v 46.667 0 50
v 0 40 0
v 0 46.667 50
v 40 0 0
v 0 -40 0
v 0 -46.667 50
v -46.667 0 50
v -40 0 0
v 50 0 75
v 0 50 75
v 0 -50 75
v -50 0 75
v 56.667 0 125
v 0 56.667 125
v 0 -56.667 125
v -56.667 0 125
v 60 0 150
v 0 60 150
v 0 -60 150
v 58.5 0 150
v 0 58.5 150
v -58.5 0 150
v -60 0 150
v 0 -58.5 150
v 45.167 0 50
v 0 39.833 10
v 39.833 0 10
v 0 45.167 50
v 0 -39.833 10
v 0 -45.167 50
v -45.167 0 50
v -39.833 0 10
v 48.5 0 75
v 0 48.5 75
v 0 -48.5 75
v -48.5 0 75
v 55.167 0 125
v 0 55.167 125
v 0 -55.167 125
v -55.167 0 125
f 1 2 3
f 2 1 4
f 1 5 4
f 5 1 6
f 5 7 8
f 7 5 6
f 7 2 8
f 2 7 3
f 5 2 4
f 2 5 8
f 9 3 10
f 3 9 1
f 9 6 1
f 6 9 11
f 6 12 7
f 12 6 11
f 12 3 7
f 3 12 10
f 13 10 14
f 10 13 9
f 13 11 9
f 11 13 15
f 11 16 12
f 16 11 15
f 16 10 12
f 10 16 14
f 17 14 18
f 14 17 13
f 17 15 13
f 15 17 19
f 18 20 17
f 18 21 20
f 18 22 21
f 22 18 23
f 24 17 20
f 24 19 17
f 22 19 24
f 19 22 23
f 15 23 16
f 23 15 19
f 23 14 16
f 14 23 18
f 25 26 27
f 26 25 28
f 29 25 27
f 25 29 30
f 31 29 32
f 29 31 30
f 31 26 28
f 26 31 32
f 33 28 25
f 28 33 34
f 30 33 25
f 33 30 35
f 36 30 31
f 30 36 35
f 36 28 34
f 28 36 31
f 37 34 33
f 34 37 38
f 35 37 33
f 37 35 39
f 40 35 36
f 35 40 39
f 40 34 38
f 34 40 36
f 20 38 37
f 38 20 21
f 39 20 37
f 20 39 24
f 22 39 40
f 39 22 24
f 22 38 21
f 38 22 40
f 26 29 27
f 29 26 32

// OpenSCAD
/*

Un générateur de machin dans lequel on met des trucs.

version aux alentours de 15.42

*/


/* [Informations générales] */
Subdvisions             = [4,4,4,4,4,4,4];
Hauteur                 = 150;
Diametre_haut           = 120;
Diametre_bas            = 80;
Epaisseur               = 3;
Epaisseur_fond          = 10;
/* [Rotation] */
Rotation_angle          = 0; //[-360:360]
Rotation_multiplicateur = 1; //[0,1,2,3,4,5]
/* [Courbure en hauteur] */
Courbure_force                  = 0; //[0:100]
Courbure_vagues                 = 0; //[0:300]
Courbure_deplacement_vertical   = 1;//[-500:500]


/* [Déplacement vertical X] */
Vague_X       = 0;//[-360:360]
Force_X       = 0;//[-150:150]
Deplacement_X = 0;//[-360:360]
/* [Déplacement vertical Y] */
Vague_Y       = 0;//[-360:360]
Force_Y       = 0;//[-150:150]
Deplacement_Y = 0;//[-360:360]


MonRecipient(
  p   = Subdvisions,
  h   = Hauteur,
  d1  = Diametre_bas,
  d2  = Diametre_haut,
  e   = Epaisseur,
  ef  = Epaisseur_fond,
  ra  = Rotation_angle,
  rm  = Rotation_multiplicateur,
  cf  = Courbure_force,
  cv  = Courbure_vagues,
  cd  = Courbure_deplacement_vertical,
  xv  = Vague_X,
  xf  = Force_X,
  xd  = Deplacement_X,
  yv  = Vague_Y,
  yf  = Force_Y,
  yd  = Deplacement_Y,
  hlp = true 
);



module MonRecipient(p,h,d1,d2,e,ef,ra,rm,cf,cv,cd,xv,xf,xd,yv,yf,yd,hlp)
{   
  p  = p  == undef ? [8,16,32] : p;  
  h  = h  == undef ? 100       : h;
  d1 = d1 == undef ? 50        : d1;
  d2 = d2 == undef ? 80        : d2;
  e  = e  == undef ? 3         : e;
  ef = ef == undef ? 10        : ef;
  ra = ra == undef ? 0         : ra;
  rm = rm == undef ? 1         : rm;
  cf = cf == undef ? 0         : cf;
  cv = cv == undef ? 0         : cv;
  cd = cd == undef ? 0         : cd;
  xv = xv == undef ? 0         : xv;
  xf = xf == undef ? 0         : xf;
  xd = xd == undef ? 0         : xd;
  yv = yv == undef ? 0         : yv;
  yf = yf == undef ? 0         : yf;
  yd = yd == undef ? 0         : yd;

  hlp = hlp == undef ? false : true;

  help(p,h,d1,d2,e,ef,ra,rm,cf,cv,cd,xv,xf,xd,yv,yf,yd,hlp);

  function fccu(a,b,c,d)    = sin(a*d*(b+c/10));
  function fcsi(a,b,c,d,e)  = sin(360/a*b*c+e)*d/a*c;

  modxv = xv/100;
  modyv = yv/100;
  modcf = cf/100;
  div   = len(p)-1;
  cnew  = 360/h;
  d3    = 360/div;
  d4    = (d2-d1)/div;
  cdnew = cd*div/10;
  
  difference()
  {
    obj(e=0,ef=0);
    obj(e=e,ef=ef);
  }
  
  module obj(e,ef)
  {  
    difference()
    {
      for(i=[0:div-1])
      {
        hull()
        {
          for(j=[0,1])
          {
            translate([fcsi(div, modxv,i+j,xf,xd),fcsi(div, modyv,i+j,yf,yd),h/div*(i+j)])
            rotate([0,0,ra/div*(i+j)*rm])
            linear_extrude(0.0000001)
            circle(d=d1-e+(fccu(d3,(i+j),cdnew,cv/100)*d1*modcf)+(d4*(i+j)),$fn=p[(i+j)]);
          }
        }
      }
      cube([d1*4,d1*2,ef*2],center=true);
    }
  }
  
  module help(p,h,d1,d2,e,ef,ra,rm,cf,cv,cd,xv,xf,xd,yv,yf,yd,hlp)
  {
      if ( hlp == false )
      {
        echo("<hr><h1>Informations</h1>
        <p>Pour obtenir de l'aide sur une variable ou des informations sur l'objet, ajouter la variable suivante :<br/><b>hlp=true</b></p><hr>");
      }
      else{
      echo("
<hr><h1>Variables</h1>
<b>p =</b> Subdvisions,<br/>
<b>h =</b> Hauteur,<br/>
<b>d1 =</b> Diametre_bas,<br/>
<b>d2 =</b> Diametre_haut,<br/>
<b>e =</b> Epaisseur,<br/>
<b>ef =</b> Epaisseur_fond,<br/>
<b>ra =</b> Rotation_angle,<br/>
<b>rm =</b> Rotation_multiplicateur,<br/>
<b>cf =</b> Courbure_force,<br/>
<b>cv =</b> Courbure_vagues,<br/>
<b>cd =</b> Courbure_deplacement_vertical,<br/>
<b>xv =</b> Vague_X,<br/>
<b>xf =</b> Force_X,<br/>
<b>xd =</b> Deplacement_X,<br/>
<b>yv =</b> Vague_Y,<br/>
<b>yf =</b> Force_Y,<br/>
<b>yd =</b> Deplacement_Y<br/>
<hr>
<h1>Informations</h1>
<table>
<tr> 
  <td><b><h2>Paramètre               </h2></b></td>
  <td><b><h2>Valeur</h2></b></td>
  <td><b><h2>Unité    </h2></b></td>
</tr>
<tr> 
  <td><i>Subdvisions</i></td>
  <td><i>",p,"</i></td>
  <td><i></i></td>
</tr>
<tr> 
  <td><i>Hauteur</i></td>
  <td><i>",h,"</i></td>
  <td><i>mm</i></td>
</tr>
<tr> 
  <td><i>Diamètre base</i></td>
  <td><i>",d1,"</i></td>
  <td><i>mm</i></td>
</tr>
<tr> 
  <td><i>Diamètre au sommet</i></td>
  <td><i>",d2,"</i></td>
  <td><i>mm</i></td>
</tr>
<tr> 
  <td><i>Epaisseur</i></td>
  <td><i>",e,"</i></td>
  <td><i>mm</i></td>
</tr>
<tr> 
  <td><i>Epaisseur du fond</i></td>
  <td><i>",ef,"</i></td>
  <td><i>mm</i></td>
</tr>
<tr> 
  <td><i>Angle de rotation</i></td>
  <td><i>",ra,"</i></td>
  <td><i>°</i></td>
</tr>
<tr> 
  <td><i>Multiplicateur de rotation</i></td>
  <td><i>",rm,"</i></td>
  <td><i>°</i></td>
</tr>
<tr> 
  <td><i>Courbure verticale - force</i></td>
  <td><i>",cf,"</i></td>
  <td><i>%</i></td>
</tr>
<tr> 
  <td><i>Courbure verticale - vague</i></td>
  <td><i>",cv,"</i></td>
  <td><i>%</i></td>
</tr>
<tr> 
  <td><i>Courbure verticale - déplacement</i></td>
  <td><i>",cd,"</i></td>
  <td><i>°</i></td>
</tr>
<tr> 
  <td><i>X - Vague </i></td>
  <td><i>",xv,"</i></td>
  <td><i>%</i></td>
</tr>
<tr> 
  <td><i>X - Force</i></td>
  <td><i>",xf,"</i></td>
  <td><i>mm</i></td>
</tr>
<tr> 
  <td><i>X - Déplacement</i></td>
  <td><i>",xd,"</i></td>
  <td><i>°</i></td>
</tr>
<tr> 
  <td><i>Y - Vague </i></td>
  <td><i>",yv,"</i></td>
  <td><i>%</i></td>
</tr>
<tr> 
  <td><i>Y - Force</i></td>
  <td><i>",yf,"</i></td>
  <td><i>mm</i></td>
</tr>
<tr> 
  <td><i>Y - Déplacement</i></td>
  <td><i>",yd,"</i></td>
  <td><i>°</i></td>
</tr>
</table>
<hr>
<h1>Volume</h1>
WIP :)
<hr>

"

//for(i=[0:p-1]){p[i]};

);
        }
      }
  
}
